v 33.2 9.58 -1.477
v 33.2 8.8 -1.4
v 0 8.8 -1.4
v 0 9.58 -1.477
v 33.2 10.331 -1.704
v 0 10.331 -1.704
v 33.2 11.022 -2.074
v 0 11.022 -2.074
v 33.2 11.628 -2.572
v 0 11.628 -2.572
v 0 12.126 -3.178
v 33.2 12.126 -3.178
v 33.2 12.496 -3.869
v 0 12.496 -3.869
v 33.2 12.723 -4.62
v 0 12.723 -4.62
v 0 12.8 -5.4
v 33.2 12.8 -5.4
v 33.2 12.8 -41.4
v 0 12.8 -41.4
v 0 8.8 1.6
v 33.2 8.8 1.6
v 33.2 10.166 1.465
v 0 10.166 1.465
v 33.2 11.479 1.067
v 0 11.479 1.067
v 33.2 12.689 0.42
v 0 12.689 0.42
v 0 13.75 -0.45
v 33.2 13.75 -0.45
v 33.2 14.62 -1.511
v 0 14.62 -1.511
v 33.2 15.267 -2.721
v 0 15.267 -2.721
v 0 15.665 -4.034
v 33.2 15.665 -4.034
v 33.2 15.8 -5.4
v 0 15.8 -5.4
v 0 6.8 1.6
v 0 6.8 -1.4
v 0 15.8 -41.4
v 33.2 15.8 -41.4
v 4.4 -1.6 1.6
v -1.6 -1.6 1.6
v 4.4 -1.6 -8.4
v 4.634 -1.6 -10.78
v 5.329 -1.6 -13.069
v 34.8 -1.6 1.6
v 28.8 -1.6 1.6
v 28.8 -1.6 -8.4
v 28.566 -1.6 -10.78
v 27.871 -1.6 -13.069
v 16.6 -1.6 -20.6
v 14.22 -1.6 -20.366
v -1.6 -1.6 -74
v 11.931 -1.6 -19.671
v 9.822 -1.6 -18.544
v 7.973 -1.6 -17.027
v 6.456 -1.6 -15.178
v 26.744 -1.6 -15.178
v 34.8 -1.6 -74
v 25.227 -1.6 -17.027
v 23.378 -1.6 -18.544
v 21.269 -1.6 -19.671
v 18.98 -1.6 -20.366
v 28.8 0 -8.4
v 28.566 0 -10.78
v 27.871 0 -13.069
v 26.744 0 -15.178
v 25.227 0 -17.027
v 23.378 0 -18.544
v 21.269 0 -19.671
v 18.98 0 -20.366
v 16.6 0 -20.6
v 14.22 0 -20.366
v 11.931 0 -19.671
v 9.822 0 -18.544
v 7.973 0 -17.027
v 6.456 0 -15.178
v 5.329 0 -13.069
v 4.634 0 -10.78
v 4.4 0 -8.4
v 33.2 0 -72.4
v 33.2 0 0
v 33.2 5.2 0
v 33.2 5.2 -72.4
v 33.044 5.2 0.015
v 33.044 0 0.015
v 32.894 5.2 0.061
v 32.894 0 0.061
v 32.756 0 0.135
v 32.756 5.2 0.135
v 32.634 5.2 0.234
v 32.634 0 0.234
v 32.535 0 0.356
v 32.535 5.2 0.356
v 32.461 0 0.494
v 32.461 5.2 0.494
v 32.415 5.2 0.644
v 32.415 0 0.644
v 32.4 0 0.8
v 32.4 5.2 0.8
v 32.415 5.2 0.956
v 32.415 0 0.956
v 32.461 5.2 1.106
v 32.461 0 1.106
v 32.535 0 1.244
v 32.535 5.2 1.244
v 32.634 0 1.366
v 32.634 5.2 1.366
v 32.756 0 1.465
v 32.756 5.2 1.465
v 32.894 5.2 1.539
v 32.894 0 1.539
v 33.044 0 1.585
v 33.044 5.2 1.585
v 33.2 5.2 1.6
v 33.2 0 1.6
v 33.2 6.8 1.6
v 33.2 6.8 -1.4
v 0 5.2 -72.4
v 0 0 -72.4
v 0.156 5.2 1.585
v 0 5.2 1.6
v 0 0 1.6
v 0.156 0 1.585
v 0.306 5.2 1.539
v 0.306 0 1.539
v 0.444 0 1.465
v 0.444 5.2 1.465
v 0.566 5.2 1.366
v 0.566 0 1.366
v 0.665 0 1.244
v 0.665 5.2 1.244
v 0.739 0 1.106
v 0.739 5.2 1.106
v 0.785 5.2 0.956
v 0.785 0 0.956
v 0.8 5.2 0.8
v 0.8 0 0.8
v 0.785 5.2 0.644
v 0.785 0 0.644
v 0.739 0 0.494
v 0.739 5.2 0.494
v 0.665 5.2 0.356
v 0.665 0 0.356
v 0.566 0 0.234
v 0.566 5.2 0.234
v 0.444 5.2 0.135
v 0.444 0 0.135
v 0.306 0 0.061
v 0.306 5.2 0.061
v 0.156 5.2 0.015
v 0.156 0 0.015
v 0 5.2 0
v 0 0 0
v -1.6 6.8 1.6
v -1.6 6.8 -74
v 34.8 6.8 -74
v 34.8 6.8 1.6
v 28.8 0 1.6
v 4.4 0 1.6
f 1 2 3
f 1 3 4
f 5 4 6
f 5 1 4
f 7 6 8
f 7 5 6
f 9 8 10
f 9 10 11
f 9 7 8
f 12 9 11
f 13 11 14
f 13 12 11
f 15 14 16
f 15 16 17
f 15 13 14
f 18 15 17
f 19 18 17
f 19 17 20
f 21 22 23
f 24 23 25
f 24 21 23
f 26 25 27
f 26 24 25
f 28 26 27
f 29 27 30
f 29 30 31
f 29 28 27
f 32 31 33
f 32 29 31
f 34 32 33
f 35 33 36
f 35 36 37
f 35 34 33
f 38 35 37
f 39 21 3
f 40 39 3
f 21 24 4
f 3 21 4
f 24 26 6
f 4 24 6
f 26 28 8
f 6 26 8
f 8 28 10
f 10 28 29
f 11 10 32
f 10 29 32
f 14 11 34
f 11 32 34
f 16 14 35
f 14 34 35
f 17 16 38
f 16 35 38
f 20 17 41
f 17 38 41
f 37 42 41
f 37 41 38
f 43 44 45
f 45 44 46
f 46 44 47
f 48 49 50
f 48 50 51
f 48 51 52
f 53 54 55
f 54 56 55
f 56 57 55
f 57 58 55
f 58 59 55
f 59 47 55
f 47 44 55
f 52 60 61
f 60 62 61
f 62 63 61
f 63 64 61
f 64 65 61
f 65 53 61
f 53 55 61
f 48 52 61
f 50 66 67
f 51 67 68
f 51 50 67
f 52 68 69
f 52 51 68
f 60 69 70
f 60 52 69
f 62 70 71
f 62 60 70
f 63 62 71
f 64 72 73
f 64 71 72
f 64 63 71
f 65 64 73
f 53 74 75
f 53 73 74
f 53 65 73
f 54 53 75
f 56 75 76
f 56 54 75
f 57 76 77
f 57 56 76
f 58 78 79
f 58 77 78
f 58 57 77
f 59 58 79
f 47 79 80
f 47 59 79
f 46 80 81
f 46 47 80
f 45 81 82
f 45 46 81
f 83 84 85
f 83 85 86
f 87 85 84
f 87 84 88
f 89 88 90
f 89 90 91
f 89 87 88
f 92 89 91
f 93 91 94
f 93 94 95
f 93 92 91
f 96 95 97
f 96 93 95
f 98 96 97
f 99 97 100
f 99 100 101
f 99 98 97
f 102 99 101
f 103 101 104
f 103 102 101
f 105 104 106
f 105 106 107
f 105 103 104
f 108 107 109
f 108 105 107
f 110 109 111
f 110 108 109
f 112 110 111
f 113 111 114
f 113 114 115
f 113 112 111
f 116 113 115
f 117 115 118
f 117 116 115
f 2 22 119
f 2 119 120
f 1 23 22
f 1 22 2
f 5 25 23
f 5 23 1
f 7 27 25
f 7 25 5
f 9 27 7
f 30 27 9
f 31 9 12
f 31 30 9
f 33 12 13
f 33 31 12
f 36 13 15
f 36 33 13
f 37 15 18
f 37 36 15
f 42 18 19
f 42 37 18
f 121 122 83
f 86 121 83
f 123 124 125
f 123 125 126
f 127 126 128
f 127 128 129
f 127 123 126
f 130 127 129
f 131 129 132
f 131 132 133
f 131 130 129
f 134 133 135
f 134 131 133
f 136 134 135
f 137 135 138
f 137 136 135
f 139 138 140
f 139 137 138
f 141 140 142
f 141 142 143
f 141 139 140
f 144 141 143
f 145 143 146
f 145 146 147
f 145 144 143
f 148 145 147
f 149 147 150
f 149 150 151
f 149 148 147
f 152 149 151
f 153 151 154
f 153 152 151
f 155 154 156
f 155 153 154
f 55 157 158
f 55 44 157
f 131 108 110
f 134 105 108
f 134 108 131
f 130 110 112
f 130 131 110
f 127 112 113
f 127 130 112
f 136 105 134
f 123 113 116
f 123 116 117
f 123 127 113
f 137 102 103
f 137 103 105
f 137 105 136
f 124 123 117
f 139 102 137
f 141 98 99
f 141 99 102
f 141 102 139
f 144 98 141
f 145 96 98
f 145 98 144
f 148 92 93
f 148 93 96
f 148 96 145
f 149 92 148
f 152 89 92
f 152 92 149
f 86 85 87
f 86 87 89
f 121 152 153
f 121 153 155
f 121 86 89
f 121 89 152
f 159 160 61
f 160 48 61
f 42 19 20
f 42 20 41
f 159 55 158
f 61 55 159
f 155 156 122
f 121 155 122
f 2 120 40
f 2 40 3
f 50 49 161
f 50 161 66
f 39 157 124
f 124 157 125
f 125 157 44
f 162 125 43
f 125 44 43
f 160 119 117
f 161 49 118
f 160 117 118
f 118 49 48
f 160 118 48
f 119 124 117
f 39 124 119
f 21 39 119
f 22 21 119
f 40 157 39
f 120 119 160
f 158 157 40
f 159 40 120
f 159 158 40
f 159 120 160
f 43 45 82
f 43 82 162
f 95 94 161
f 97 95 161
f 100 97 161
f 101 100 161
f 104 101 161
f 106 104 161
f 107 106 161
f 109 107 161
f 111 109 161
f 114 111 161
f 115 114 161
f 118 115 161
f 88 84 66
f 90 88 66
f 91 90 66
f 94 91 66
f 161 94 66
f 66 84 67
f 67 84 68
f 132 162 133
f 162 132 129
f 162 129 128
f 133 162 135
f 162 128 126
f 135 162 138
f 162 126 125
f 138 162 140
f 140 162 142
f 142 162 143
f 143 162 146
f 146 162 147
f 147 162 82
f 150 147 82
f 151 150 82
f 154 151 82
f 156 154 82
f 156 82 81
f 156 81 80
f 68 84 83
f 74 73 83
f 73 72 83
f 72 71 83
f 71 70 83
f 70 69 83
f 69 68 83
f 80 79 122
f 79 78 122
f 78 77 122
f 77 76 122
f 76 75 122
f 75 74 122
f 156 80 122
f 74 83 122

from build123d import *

# Parameters (mm, degrees)
SKETCH1_W           = 36.4
SKETCH1_H           = 75.6
SKETCH1_W_2         = 33.2
SKETCH1_H_2         = 72.4
BOSS_EXTRUDE1_DEPTH = 5.2
SKETCH2_W           = 36.4
SKETCH2_H           = 75.6
BOSS_EXTRUDE2_DEPTH = 1.6
BOSS_EXTRUDE3_START = 5.2
SKETCH2_2_W         = 36.4
SKETCH2_2_H         = 75.6
BOSS_EXTRUDE3_DEPTH = 1.6
CUT_EXTRUDE1_START  = -1.6
CUT_EXTRUDE1_DEPTH  = 5.2
BOSS_EXTRUDE4_START = -1.6
BOSS_EXTRUDE4_DEPTH = 33.2
CUT_EXTRUDE2_DEPTH  = 2
FILLET1_R           = 7


with BuildPart() as part:
    # Sketch1 → Boss-Extrude1 (new body)
    with BuildSketch(Plane(origin=(0, 0, 0), x_dir=(1, 0, 0), z_dir=(0, 1, 0))):
        with Locations((16.6, 36.2)):
            Rectangle(SKETCH1_W, SKETCH1_H)
        with Locations((16.6, 36.2)):
            Rectangle(SKETCH1_W_2, SKETCH1_H_2, mode=Mode.SUBTRACT)
    extrude(amount=BOSS_EXTRUDE1_DEPTH)

    # Sketch2 → Boss-Extrude2 (add)
    with BuildSketch(Plane(origin=(0, 0, 0), x_dir=(1, 0, 0), z_dir=(0, 1, 0))):
        with Locations((16.6, 36.2)):
            Rectangle(SKETCH2_W, SKETCH2_H)
    extrude(amount=-BOSS_EXTRUDE2_DEPTH)

    # Sketch2<2> → Boss-Extrude3 (add)
    with BuildSketch(Plane(origin=(0, 0, 0), x_dir=(1, 0, 0), z_dir=(0, 1, 0)).offset(BOSS_EXTRUDE3_START)):
        with Locations((16.6, 36.2)):
            Rectangle(SKETCH2_2_W, SKETCH2_2_H)
    extrude(amount=BOSS_EXTRUDE3_DEPTH)

    # Sketch3 → Cut-Extrude1 (cut)
    with BuildSketch(Plane(origin=(0, 6.8, 0), x_dir=(1, 0, 0), z_dir=(0, 1, 0)).offset(CUT_EXTRUDE1_START)):
        with BuildLine():
            Line((0, 0), (33.2, 0))
            ThreePointArc((33.2, 0), (32.4, -0.8), (33.2, -1.6))
            Line((33.2, -1.6), (0, -1.6))
            ThreePointArc((0, -1.6), (0.8, -0.8), (0, 0))
        make_face()
    extrude(amount=-CUT_EXTRUDE1_DEPTH, mode=Mode.SUBTRACT)

    # Sketch4 → Boss-Extrude4 (add)
    with BuildSketch(Plane(origin=(34.8, 0, 0), x_dir=(0, 0, -1), z_dir=(1, 0, 0)).offset(BOSS_EXTRUDE4_START)):
        with BuildLine():
            Line((1.4, 6.8), (1.4, 8.8))
            ThreePointArc((1.4, 8.8), (2.571572875, 11.628427125), (5.4, 12.8))
            Line((5.4, 12.8), (41.4, 12.8))
            Line((41.4, 12.8), (41.4, 15.8))
            Line((41.4, 15.8), (-1.6, 15.8))
            Line((-1.6, 15.8), (-1.6, 6.8))
            Line((-1.6, 6.8), (1.4, 6.8))
        make_face()
    extrude(amount=-BOSS_EXTRUDE4_DEPTH)

    # Sketch5 → Cut-Extrude2 (cut)
    with BuildSketch(Plane.XZ.offset(1.6)):
        with BuildLine():
            Line((4.4, 1.6), (28.8, 1.6))
            Line((28.8, 1.6), (28.8, -8.4))
            ThreePointArc((28.8, -8.4), (16.6, -20.6), (4.4, -8.4))
            Line((4.4, -8.4), (4.4, 1.6))
        make_face()
    extrude(amount=-CUT_EXTRUDE2_DEPTH, mode=Mode.SUBTRACT)

    # Fillet1
    fillet1_edges = [part.edges().sort_by_distance(p)[0] for p in [
        (16.6, 15.8, 1.6),
    ]]
    fillet(fillet1_edges, radius=FILLET1_R)


solid = part.part
